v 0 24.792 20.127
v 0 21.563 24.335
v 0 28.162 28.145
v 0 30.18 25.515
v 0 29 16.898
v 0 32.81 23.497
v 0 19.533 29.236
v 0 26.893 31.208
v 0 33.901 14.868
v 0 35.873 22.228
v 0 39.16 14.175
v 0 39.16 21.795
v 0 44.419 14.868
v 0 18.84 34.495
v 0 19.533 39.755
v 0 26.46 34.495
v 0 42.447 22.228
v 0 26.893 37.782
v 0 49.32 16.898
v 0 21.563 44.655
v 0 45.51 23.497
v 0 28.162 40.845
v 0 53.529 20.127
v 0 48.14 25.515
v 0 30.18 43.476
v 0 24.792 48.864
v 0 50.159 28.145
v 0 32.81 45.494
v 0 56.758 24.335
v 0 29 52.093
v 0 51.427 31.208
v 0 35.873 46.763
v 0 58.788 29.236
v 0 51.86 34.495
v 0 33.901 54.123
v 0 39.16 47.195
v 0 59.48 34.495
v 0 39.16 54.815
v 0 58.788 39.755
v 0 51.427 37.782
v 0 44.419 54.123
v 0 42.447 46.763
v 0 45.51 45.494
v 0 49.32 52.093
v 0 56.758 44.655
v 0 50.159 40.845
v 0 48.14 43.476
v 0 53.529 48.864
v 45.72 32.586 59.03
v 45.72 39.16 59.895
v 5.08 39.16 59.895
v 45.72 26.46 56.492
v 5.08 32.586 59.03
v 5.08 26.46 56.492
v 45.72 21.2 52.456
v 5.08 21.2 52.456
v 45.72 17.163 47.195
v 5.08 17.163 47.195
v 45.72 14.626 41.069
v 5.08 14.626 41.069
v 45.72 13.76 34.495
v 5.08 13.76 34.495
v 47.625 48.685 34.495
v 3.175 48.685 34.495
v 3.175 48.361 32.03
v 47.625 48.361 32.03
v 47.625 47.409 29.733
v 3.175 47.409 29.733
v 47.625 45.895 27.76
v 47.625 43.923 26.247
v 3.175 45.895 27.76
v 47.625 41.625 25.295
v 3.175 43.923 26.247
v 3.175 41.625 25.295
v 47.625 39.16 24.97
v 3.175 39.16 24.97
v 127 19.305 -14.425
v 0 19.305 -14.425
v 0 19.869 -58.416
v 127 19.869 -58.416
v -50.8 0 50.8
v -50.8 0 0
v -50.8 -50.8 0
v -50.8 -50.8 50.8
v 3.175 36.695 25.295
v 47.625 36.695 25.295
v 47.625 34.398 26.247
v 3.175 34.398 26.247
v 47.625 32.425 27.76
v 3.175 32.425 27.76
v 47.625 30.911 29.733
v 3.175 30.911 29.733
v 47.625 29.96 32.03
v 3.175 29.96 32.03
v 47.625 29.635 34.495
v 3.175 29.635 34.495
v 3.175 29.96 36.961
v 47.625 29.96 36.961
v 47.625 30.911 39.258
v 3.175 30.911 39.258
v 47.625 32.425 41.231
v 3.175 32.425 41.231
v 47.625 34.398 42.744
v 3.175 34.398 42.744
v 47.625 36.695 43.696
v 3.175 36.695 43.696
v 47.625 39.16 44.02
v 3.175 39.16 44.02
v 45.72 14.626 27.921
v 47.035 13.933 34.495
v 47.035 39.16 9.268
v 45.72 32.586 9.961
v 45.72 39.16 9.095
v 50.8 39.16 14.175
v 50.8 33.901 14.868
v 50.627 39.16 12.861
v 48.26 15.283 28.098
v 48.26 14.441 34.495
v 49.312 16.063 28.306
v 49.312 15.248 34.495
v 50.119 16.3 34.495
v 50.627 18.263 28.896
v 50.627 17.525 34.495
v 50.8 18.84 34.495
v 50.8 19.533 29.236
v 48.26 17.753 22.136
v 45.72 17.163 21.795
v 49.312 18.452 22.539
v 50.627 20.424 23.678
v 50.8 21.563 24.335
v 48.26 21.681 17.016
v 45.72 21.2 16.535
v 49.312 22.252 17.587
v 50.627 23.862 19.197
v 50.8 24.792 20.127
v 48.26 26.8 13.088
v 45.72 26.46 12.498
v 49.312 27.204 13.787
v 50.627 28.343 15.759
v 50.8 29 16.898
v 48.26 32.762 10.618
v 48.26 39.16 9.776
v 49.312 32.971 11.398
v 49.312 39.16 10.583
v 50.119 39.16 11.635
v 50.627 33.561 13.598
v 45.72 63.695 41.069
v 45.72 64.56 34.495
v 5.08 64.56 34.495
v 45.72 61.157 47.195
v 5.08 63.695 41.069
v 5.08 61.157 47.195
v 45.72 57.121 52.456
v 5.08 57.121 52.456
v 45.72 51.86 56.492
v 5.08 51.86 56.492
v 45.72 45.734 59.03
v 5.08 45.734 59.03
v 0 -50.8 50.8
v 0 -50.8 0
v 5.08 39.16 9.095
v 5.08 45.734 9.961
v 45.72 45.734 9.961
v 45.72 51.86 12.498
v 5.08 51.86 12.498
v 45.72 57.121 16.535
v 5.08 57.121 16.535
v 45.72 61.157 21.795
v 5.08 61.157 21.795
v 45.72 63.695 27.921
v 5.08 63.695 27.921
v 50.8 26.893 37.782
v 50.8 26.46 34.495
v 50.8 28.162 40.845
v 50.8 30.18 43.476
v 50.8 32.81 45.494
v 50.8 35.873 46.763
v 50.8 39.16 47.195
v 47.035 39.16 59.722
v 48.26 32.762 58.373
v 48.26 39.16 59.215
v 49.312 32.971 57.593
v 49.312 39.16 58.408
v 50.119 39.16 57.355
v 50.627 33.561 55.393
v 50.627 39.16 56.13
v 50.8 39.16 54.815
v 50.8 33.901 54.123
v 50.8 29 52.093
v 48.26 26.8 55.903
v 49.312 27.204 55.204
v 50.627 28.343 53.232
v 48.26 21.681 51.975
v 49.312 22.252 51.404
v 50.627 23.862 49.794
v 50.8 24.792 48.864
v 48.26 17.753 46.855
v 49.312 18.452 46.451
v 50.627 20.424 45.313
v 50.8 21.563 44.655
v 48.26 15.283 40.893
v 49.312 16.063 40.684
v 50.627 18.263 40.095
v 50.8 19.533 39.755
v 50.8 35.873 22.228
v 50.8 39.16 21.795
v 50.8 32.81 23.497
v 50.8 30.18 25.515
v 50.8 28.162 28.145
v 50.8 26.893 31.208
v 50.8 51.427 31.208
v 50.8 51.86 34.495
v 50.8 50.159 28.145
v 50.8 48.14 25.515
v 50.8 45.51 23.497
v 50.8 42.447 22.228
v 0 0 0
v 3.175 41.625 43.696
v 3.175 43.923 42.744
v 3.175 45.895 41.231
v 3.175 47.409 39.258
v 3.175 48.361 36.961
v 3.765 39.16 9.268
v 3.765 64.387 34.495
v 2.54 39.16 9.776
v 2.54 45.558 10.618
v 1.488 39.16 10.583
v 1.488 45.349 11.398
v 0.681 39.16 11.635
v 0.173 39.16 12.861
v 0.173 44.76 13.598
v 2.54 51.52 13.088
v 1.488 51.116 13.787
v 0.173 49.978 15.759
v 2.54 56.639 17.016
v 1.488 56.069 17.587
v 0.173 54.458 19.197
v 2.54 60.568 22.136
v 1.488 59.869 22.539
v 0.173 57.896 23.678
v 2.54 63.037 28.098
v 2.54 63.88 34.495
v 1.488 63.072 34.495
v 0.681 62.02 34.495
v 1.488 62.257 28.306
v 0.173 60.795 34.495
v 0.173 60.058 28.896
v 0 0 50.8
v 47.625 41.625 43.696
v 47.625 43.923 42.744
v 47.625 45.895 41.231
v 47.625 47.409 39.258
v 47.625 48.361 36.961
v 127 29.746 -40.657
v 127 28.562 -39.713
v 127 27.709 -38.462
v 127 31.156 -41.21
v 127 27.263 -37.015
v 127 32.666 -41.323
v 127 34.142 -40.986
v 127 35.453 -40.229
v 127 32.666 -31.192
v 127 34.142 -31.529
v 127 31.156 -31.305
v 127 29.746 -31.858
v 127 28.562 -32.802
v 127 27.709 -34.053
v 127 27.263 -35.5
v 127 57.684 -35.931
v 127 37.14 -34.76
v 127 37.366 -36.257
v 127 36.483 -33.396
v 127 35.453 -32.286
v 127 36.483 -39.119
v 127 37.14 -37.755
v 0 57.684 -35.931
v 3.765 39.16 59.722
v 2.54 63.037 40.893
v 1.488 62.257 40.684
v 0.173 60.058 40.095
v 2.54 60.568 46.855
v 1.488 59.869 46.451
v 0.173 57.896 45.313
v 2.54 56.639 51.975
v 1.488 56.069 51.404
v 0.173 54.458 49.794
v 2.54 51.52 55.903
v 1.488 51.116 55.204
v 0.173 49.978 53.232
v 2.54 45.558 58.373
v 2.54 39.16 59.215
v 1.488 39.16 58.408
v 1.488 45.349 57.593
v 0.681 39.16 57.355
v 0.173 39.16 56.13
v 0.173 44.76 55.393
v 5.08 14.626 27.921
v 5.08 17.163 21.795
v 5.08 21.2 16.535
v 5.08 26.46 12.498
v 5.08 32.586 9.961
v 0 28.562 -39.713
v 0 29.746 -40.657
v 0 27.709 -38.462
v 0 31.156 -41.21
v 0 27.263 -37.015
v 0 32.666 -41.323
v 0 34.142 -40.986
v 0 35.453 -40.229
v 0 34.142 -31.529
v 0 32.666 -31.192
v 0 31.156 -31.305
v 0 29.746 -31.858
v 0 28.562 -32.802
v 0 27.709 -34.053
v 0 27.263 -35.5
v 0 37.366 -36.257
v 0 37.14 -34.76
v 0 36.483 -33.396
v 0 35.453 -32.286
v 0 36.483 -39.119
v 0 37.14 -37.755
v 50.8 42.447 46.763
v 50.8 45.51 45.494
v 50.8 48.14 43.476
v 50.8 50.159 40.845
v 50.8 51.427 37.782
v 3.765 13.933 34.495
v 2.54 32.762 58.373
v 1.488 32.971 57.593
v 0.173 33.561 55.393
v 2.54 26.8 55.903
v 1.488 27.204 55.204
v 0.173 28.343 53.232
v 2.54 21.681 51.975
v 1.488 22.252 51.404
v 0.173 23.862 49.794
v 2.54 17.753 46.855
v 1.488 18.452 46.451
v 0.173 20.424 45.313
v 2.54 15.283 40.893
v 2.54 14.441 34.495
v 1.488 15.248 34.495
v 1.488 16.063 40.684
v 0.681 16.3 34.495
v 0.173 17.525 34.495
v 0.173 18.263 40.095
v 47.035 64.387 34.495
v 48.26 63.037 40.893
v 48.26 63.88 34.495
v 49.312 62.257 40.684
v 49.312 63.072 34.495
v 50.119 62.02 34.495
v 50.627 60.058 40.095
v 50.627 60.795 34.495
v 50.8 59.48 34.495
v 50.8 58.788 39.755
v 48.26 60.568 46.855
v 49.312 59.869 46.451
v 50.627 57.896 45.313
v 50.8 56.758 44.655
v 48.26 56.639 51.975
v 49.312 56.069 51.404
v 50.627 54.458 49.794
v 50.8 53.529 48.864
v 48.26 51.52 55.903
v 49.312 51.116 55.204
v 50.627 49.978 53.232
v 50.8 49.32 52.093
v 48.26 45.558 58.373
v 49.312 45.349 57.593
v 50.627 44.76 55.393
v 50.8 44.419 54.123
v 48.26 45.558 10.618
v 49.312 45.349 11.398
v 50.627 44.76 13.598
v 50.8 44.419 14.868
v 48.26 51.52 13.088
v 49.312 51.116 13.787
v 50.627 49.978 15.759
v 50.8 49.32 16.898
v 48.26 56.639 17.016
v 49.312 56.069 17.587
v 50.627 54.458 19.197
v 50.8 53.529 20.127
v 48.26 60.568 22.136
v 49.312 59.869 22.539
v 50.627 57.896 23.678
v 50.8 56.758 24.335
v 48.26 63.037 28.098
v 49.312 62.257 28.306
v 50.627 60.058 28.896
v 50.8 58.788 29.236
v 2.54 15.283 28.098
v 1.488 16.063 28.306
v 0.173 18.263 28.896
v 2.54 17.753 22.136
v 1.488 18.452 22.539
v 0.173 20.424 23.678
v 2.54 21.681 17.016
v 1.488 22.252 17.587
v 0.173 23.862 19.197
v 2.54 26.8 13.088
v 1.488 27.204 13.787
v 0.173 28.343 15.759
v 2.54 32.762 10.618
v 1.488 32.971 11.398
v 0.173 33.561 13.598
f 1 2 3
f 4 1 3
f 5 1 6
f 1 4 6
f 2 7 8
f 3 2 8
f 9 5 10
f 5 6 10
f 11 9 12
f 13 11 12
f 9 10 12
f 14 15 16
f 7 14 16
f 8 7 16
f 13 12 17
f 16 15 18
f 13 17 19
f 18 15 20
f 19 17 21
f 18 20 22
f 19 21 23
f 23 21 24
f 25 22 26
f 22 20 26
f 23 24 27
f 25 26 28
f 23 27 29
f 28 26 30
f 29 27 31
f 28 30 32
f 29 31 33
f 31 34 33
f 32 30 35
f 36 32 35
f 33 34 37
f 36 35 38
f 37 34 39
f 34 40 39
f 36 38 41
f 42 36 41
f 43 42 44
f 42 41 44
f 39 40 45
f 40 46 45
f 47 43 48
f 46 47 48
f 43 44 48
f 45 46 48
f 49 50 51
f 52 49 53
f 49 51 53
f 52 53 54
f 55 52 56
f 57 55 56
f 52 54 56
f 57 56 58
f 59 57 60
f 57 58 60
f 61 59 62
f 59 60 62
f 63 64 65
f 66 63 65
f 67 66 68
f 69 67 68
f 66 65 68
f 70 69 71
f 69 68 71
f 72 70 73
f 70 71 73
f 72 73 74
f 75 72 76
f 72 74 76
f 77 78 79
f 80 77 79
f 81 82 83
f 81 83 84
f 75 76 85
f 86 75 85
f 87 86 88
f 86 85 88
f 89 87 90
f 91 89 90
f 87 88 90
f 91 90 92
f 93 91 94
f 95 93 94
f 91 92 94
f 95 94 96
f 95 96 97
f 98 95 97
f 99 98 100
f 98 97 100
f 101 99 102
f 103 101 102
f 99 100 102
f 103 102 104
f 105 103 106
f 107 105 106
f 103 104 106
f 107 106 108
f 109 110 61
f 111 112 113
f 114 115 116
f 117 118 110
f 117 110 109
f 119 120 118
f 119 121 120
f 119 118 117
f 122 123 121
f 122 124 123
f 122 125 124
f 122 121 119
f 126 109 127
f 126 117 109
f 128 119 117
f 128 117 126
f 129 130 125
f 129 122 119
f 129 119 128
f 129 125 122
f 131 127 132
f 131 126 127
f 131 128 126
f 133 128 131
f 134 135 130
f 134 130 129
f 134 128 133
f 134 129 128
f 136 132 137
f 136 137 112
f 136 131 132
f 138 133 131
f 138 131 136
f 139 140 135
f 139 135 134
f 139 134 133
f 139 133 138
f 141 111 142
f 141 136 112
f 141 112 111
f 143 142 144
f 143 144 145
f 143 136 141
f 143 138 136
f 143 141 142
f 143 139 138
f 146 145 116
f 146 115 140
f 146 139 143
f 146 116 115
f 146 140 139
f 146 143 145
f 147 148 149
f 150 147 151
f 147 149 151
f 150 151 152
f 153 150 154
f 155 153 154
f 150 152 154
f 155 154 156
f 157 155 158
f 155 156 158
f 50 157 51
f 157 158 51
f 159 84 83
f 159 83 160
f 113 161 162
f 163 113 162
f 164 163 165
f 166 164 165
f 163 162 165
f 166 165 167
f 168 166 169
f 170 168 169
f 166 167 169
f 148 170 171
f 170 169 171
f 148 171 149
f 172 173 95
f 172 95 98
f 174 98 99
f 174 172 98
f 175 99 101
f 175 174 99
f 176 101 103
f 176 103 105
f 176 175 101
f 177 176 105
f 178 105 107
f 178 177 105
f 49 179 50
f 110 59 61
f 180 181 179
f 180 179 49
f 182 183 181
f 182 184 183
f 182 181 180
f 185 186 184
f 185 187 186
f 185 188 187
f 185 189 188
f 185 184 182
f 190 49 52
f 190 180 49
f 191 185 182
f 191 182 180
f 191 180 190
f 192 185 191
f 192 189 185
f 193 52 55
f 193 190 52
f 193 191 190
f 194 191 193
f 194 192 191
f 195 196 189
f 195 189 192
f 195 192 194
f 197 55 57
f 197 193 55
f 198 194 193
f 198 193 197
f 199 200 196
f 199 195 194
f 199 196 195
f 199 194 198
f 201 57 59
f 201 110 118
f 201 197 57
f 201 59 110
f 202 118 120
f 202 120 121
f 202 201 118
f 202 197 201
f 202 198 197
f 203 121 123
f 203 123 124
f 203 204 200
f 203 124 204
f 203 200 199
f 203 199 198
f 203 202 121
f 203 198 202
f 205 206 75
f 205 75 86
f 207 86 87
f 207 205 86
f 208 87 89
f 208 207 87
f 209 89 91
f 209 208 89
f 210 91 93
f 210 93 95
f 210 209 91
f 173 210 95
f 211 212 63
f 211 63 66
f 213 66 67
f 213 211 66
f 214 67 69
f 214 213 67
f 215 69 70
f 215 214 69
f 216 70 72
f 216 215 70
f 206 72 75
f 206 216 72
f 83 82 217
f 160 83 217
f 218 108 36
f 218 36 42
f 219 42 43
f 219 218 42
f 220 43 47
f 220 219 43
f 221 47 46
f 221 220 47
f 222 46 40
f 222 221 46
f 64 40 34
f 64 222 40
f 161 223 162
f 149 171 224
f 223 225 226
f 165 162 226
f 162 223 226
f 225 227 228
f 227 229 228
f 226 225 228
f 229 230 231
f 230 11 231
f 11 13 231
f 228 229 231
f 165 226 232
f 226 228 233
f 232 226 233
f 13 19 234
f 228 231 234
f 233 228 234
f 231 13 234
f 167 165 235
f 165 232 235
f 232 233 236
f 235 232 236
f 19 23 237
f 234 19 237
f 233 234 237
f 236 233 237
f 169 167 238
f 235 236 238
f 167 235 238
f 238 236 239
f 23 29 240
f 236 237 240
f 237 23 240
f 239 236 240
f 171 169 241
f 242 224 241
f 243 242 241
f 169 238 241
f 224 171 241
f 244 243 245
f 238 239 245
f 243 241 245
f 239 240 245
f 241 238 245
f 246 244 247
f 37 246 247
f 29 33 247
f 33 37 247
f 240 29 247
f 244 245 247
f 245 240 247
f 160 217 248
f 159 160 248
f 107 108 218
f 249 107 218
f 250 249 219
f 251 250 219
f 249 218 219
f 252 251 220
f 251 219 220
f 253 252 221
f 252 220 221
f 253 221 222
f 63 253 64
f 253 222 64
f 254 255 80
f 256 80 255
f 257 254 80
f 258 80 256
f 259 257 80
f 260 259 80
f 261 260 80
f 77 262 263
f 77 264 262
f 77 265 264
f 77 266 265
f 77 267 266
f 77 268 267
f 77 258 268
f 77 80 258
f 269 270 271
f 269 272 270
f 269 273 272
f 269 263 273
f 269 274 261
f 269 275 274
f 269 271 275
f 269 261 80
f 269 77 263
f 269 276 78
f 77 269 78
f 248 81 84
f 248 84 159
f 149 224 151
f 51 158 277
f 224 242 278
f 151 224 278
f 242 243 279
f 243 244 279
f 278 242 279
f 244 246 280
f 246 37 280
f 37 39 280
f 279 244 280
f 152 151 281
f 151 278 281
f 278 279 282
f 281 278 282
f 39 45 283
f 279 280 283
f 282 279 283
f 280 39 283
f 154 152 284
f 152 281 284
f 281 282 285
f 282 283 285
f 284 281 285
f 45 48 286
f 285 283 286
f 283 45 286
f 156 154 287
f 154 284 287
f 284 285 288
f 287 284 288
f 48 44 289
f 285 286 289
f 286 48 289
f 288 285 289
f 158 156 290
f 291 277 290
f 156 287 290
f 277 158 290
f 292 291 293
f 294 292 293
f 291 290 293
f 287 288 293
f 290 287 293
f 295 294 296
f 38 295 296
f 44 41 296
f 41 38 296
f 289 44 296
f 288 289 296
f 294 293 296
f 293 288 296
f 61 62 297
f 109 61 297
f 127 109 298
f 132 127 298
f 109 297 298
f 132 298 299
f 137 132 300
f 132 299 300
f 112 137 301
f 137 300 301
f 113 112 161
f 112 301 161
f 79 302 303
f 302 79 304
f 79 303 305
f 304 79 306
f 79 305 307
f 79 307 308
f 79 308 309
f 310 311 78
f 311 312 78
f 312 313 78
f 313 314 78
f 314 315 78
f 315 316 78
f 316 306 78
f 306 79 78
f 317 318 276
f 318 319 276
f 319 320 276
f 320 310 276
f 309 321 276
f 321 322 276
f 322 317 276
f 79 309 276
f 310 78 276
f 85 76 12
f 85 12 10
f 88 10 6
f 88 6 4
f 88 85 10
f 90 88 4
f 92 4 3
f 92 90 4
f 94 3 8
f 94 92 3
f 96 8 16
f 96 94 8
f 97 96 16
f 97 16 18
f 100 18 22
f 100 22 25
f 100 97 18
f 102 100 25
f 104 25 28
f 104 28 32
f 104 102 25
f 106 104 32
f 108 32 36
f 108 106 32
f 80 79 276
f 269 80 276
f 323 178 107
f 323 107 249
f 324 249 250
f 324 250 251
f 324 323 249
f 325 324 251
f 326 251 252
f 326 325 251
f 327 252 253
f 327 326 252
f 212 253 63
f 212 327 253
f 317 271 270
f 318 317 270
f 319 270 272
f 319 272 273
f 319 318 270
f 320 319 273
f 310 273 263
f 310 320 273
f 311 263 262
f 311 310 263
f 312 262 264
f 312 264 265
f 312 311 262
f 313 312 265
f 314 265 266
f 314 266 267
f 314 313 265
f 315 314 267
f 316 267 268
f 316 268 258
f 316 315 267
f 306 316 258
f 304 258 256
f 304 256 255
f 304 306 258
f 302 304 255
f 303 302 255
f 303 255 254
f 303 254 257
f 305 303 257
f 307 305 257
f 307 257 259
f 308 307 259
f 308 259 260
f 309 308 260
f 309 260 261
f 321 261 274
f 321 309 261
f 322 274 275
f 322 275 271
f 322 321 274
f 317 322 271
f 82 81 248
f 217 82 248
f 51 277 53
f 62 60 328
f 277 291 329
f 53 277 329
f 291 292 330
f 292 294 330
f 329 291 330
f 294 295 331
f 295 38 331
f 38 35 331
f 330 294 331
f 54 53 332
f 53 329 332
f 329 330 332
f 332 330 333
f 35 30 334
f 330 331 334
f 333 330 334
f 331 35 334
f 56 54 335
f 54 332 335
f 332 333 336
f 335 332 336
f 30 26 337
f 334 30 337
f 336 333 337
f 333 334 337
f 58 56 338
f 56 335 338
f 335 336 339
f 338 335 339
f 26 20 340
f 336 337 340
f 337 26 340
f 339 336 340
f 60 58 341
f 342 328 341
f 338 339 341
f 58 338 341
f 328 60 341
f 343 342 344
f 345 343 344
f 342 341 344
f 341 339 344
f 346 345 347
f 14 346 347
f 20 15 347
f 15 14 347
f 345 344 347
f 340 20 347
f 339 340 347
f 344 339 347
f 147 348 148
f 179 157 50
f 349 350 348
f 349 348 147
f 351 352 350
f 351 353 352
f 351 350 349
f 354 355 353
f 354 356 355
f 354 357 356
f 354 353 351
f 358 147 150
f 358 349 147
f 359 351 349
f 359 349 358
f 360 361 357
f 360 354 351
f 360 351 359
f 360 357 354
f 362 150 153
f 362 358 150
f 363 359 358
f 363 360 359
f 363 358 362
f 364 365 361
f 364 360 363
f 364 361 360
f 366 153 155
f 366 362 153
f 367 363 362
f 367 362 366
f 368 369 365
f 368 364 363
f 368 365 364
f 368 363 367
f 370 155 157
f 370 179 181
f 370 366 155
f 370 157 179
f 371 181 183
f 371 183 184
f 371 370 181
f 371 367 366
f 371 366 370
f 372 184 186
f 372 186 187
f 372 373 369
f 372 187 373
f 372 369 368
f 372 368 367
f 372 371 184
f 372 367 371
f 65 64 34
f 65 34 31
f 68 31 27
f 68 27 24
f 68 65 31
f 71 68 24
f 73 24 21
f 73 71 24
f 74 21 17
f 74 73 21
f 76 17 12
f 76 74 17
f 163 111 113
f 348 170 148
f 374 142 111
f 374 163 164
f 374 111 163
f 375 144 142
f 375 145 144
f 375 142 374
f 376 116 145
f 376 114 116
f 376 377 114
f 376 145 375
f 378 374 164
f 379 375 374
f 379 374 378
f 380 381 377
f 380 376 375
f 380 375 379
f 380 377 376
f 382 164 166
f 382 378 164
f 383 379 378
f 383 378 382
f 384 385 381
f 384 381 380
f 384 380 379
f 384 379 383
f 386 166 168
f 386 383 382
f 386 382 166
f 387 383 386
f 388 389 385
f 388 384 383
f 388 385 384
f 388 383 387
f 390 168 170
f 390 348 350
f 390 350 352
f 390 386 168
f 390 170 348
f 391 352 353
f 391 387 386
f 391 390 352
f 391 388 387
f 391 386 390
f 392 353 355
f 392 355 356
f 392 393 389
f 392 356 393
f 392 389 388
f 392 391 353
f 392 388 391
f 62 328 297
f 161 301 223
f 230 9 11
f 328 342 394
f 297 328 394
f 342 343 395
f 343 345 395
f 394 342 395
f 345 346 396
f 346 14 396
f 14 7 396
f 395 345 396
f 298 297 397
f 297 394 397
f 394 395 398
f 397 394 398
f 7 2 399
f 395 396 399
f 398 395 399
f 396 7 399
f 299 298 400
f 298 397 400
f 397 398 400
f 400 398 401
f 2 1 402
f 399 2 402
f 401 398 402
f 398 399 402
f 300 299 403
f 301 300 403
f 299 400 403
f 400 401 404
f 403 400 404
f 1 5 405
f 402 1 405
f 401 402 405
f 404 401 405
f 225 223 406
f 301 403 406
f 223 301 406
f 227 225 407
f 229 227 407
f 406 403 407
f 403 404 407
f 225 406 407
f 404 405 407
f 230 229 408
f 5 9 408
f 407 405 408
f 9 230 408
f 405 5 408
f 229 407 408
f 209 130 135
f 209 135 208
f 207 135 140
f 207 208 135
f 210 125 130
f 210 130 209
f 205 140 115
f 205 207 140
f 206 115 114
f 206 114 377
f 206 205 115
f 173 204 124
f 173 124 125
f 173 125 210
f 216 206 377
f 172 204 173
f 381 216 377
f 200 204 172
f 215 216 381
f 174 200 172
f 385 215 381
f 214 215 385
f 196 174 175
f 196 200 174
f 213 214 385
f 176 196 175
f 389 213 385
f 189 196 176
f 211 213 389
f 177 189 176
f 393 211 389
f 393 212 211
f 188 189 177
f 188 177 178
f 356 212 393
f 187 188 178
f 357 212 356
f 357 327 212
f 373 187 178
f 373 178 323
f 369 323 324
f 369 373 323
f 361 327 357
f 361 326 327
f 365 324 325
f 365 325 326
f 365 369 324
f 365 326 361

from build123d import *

# Parameters (mm, degrees)
F0_W     = 50.8
F0_H     = 50.8
F1_DEPTH = 50.8
F3_DEPTH = 50.8
F4_R     = 5.08
F5_SIZE  = 3.175
F6_SIZE  = 3.175
F7_R     = 5.08
F8_DEPTH = 127


with BuildPart() as f1:
    # F0 (on Front) → F1 (new body)
    with BuildSketch(Plane.XZ):
        with Locations((-25.4, 25.4)):
            Rectangle(F0_W, F0_H)
    extrude(amount=F1_DEPTH)


with BuildPart() as f3:
    # F2 (on Right) → F3 (new body)
    with BuildSketch(Plane.YZ):
        with BuildLine():
            Line((48.6851525075, 34.495400198), (64.5601525075, 34.495400198))
            ThreePointArc((64.5601525075, 34.495400198), (57.1206647496, 52.4559124401), (39.1601525075, 59.895400198))
            Line((39.1601525075, 59.895400198), (39.1601525075, 44.020400198))
            ThreePointArc((39.1601525075, 44.020400198), (45.8953445983, 41.2305922888), (48.6851525075, 34.495400198))
        make_face()
        with BuildLine():
            Line((39.1601525075, 44.020400198), (39.1601525075, 59.895400198))
            ThreePointArc((39.1601525075, 59.895400198), (21.1996402654, 52.4559124401), (13.7601525075, 34.495400198))
            Line((13.7601525075, 34.495400198), (29.6351525075, 34.495400198))
            ThreePointArc((29.6351525075, 34.495400198), (32.4249604167, 41.2305922888), (39.1601525075, 44.020400198))
        make_face()
        with BuildLine():
            ThreePointArc((13.7601525075, 34.495400198), (21.1996402654, 16.5348879559), (39.1601525075, 9.095400198))
            Line((39.1601525075, 9.095400198), (39.1601525075, 24.970400198))
            ThreePointArc((39.1601525075, 24.970400198), (32.4249604167, 27.7602081072), (29.6351525075, 34.495400198))
            Line((29.6351525075, 34.495400198), (13.7601525075, 34.495400198))
        make_face()
        with BuildLine():
            ThreePointArc((39.1601525075, 9.095400198), (57.1206647496, 16.5348879559), (64.5601525075, 34.495400198))
            Line((64.5601525075, 34.495400198), (48.6851525075, 34.495400198))
            ThreePointArc((48.6851525075, 34.495400198), (45.8953445983, 27.7602081072), (39.1601525075, 24.970400198))
            Line((39.1601525075, 24.970400198), (39.1601525075, 9.095400198))
        make_face()
    extrude(amount=F3_DEPTH)

    # F4
    f4_edges = [f3.edges().sort_by_distance(p)[0] for p in [
        (50.8, 39.160153, 59.8954),
        (0, 39.160153, 59.8954),
    ]]
    fillet(f4_edges, radius=F4_R)

    # F5
    f5_edges = [f3.edges().sort_by_distance(p)[0] for p in [
        (0, 29.635153, 34.4954),
    ]]
    chamfer(f5_edges, length=F5_SIZE)

    # F6
    f6_edges = [f3.edges().sort_by_distance(p)[0] for p in [
        (50.8, 29.635153, 34.4954),
    ]]
    chamfer(f6_edges, length=F6_SIZE)


with BuildPart() as f8:
    # F7 (on Right) → F8 (new body)
    with BuildSketch(Plane.YZ):
        Polygon((19.8693240316, -58.4157209222), (57.6838168302, -35.9314122963), (19.3045879744, -14.4252552145), align=None)
        with Locations((32.2859096121, -36.257462811)):
            Circle(F7_R, mode=Mode.SUBTRACT)
    extrude(amount=F8_DEPTH)


solid = Compound([f1.part, f3.part, f8.part])
